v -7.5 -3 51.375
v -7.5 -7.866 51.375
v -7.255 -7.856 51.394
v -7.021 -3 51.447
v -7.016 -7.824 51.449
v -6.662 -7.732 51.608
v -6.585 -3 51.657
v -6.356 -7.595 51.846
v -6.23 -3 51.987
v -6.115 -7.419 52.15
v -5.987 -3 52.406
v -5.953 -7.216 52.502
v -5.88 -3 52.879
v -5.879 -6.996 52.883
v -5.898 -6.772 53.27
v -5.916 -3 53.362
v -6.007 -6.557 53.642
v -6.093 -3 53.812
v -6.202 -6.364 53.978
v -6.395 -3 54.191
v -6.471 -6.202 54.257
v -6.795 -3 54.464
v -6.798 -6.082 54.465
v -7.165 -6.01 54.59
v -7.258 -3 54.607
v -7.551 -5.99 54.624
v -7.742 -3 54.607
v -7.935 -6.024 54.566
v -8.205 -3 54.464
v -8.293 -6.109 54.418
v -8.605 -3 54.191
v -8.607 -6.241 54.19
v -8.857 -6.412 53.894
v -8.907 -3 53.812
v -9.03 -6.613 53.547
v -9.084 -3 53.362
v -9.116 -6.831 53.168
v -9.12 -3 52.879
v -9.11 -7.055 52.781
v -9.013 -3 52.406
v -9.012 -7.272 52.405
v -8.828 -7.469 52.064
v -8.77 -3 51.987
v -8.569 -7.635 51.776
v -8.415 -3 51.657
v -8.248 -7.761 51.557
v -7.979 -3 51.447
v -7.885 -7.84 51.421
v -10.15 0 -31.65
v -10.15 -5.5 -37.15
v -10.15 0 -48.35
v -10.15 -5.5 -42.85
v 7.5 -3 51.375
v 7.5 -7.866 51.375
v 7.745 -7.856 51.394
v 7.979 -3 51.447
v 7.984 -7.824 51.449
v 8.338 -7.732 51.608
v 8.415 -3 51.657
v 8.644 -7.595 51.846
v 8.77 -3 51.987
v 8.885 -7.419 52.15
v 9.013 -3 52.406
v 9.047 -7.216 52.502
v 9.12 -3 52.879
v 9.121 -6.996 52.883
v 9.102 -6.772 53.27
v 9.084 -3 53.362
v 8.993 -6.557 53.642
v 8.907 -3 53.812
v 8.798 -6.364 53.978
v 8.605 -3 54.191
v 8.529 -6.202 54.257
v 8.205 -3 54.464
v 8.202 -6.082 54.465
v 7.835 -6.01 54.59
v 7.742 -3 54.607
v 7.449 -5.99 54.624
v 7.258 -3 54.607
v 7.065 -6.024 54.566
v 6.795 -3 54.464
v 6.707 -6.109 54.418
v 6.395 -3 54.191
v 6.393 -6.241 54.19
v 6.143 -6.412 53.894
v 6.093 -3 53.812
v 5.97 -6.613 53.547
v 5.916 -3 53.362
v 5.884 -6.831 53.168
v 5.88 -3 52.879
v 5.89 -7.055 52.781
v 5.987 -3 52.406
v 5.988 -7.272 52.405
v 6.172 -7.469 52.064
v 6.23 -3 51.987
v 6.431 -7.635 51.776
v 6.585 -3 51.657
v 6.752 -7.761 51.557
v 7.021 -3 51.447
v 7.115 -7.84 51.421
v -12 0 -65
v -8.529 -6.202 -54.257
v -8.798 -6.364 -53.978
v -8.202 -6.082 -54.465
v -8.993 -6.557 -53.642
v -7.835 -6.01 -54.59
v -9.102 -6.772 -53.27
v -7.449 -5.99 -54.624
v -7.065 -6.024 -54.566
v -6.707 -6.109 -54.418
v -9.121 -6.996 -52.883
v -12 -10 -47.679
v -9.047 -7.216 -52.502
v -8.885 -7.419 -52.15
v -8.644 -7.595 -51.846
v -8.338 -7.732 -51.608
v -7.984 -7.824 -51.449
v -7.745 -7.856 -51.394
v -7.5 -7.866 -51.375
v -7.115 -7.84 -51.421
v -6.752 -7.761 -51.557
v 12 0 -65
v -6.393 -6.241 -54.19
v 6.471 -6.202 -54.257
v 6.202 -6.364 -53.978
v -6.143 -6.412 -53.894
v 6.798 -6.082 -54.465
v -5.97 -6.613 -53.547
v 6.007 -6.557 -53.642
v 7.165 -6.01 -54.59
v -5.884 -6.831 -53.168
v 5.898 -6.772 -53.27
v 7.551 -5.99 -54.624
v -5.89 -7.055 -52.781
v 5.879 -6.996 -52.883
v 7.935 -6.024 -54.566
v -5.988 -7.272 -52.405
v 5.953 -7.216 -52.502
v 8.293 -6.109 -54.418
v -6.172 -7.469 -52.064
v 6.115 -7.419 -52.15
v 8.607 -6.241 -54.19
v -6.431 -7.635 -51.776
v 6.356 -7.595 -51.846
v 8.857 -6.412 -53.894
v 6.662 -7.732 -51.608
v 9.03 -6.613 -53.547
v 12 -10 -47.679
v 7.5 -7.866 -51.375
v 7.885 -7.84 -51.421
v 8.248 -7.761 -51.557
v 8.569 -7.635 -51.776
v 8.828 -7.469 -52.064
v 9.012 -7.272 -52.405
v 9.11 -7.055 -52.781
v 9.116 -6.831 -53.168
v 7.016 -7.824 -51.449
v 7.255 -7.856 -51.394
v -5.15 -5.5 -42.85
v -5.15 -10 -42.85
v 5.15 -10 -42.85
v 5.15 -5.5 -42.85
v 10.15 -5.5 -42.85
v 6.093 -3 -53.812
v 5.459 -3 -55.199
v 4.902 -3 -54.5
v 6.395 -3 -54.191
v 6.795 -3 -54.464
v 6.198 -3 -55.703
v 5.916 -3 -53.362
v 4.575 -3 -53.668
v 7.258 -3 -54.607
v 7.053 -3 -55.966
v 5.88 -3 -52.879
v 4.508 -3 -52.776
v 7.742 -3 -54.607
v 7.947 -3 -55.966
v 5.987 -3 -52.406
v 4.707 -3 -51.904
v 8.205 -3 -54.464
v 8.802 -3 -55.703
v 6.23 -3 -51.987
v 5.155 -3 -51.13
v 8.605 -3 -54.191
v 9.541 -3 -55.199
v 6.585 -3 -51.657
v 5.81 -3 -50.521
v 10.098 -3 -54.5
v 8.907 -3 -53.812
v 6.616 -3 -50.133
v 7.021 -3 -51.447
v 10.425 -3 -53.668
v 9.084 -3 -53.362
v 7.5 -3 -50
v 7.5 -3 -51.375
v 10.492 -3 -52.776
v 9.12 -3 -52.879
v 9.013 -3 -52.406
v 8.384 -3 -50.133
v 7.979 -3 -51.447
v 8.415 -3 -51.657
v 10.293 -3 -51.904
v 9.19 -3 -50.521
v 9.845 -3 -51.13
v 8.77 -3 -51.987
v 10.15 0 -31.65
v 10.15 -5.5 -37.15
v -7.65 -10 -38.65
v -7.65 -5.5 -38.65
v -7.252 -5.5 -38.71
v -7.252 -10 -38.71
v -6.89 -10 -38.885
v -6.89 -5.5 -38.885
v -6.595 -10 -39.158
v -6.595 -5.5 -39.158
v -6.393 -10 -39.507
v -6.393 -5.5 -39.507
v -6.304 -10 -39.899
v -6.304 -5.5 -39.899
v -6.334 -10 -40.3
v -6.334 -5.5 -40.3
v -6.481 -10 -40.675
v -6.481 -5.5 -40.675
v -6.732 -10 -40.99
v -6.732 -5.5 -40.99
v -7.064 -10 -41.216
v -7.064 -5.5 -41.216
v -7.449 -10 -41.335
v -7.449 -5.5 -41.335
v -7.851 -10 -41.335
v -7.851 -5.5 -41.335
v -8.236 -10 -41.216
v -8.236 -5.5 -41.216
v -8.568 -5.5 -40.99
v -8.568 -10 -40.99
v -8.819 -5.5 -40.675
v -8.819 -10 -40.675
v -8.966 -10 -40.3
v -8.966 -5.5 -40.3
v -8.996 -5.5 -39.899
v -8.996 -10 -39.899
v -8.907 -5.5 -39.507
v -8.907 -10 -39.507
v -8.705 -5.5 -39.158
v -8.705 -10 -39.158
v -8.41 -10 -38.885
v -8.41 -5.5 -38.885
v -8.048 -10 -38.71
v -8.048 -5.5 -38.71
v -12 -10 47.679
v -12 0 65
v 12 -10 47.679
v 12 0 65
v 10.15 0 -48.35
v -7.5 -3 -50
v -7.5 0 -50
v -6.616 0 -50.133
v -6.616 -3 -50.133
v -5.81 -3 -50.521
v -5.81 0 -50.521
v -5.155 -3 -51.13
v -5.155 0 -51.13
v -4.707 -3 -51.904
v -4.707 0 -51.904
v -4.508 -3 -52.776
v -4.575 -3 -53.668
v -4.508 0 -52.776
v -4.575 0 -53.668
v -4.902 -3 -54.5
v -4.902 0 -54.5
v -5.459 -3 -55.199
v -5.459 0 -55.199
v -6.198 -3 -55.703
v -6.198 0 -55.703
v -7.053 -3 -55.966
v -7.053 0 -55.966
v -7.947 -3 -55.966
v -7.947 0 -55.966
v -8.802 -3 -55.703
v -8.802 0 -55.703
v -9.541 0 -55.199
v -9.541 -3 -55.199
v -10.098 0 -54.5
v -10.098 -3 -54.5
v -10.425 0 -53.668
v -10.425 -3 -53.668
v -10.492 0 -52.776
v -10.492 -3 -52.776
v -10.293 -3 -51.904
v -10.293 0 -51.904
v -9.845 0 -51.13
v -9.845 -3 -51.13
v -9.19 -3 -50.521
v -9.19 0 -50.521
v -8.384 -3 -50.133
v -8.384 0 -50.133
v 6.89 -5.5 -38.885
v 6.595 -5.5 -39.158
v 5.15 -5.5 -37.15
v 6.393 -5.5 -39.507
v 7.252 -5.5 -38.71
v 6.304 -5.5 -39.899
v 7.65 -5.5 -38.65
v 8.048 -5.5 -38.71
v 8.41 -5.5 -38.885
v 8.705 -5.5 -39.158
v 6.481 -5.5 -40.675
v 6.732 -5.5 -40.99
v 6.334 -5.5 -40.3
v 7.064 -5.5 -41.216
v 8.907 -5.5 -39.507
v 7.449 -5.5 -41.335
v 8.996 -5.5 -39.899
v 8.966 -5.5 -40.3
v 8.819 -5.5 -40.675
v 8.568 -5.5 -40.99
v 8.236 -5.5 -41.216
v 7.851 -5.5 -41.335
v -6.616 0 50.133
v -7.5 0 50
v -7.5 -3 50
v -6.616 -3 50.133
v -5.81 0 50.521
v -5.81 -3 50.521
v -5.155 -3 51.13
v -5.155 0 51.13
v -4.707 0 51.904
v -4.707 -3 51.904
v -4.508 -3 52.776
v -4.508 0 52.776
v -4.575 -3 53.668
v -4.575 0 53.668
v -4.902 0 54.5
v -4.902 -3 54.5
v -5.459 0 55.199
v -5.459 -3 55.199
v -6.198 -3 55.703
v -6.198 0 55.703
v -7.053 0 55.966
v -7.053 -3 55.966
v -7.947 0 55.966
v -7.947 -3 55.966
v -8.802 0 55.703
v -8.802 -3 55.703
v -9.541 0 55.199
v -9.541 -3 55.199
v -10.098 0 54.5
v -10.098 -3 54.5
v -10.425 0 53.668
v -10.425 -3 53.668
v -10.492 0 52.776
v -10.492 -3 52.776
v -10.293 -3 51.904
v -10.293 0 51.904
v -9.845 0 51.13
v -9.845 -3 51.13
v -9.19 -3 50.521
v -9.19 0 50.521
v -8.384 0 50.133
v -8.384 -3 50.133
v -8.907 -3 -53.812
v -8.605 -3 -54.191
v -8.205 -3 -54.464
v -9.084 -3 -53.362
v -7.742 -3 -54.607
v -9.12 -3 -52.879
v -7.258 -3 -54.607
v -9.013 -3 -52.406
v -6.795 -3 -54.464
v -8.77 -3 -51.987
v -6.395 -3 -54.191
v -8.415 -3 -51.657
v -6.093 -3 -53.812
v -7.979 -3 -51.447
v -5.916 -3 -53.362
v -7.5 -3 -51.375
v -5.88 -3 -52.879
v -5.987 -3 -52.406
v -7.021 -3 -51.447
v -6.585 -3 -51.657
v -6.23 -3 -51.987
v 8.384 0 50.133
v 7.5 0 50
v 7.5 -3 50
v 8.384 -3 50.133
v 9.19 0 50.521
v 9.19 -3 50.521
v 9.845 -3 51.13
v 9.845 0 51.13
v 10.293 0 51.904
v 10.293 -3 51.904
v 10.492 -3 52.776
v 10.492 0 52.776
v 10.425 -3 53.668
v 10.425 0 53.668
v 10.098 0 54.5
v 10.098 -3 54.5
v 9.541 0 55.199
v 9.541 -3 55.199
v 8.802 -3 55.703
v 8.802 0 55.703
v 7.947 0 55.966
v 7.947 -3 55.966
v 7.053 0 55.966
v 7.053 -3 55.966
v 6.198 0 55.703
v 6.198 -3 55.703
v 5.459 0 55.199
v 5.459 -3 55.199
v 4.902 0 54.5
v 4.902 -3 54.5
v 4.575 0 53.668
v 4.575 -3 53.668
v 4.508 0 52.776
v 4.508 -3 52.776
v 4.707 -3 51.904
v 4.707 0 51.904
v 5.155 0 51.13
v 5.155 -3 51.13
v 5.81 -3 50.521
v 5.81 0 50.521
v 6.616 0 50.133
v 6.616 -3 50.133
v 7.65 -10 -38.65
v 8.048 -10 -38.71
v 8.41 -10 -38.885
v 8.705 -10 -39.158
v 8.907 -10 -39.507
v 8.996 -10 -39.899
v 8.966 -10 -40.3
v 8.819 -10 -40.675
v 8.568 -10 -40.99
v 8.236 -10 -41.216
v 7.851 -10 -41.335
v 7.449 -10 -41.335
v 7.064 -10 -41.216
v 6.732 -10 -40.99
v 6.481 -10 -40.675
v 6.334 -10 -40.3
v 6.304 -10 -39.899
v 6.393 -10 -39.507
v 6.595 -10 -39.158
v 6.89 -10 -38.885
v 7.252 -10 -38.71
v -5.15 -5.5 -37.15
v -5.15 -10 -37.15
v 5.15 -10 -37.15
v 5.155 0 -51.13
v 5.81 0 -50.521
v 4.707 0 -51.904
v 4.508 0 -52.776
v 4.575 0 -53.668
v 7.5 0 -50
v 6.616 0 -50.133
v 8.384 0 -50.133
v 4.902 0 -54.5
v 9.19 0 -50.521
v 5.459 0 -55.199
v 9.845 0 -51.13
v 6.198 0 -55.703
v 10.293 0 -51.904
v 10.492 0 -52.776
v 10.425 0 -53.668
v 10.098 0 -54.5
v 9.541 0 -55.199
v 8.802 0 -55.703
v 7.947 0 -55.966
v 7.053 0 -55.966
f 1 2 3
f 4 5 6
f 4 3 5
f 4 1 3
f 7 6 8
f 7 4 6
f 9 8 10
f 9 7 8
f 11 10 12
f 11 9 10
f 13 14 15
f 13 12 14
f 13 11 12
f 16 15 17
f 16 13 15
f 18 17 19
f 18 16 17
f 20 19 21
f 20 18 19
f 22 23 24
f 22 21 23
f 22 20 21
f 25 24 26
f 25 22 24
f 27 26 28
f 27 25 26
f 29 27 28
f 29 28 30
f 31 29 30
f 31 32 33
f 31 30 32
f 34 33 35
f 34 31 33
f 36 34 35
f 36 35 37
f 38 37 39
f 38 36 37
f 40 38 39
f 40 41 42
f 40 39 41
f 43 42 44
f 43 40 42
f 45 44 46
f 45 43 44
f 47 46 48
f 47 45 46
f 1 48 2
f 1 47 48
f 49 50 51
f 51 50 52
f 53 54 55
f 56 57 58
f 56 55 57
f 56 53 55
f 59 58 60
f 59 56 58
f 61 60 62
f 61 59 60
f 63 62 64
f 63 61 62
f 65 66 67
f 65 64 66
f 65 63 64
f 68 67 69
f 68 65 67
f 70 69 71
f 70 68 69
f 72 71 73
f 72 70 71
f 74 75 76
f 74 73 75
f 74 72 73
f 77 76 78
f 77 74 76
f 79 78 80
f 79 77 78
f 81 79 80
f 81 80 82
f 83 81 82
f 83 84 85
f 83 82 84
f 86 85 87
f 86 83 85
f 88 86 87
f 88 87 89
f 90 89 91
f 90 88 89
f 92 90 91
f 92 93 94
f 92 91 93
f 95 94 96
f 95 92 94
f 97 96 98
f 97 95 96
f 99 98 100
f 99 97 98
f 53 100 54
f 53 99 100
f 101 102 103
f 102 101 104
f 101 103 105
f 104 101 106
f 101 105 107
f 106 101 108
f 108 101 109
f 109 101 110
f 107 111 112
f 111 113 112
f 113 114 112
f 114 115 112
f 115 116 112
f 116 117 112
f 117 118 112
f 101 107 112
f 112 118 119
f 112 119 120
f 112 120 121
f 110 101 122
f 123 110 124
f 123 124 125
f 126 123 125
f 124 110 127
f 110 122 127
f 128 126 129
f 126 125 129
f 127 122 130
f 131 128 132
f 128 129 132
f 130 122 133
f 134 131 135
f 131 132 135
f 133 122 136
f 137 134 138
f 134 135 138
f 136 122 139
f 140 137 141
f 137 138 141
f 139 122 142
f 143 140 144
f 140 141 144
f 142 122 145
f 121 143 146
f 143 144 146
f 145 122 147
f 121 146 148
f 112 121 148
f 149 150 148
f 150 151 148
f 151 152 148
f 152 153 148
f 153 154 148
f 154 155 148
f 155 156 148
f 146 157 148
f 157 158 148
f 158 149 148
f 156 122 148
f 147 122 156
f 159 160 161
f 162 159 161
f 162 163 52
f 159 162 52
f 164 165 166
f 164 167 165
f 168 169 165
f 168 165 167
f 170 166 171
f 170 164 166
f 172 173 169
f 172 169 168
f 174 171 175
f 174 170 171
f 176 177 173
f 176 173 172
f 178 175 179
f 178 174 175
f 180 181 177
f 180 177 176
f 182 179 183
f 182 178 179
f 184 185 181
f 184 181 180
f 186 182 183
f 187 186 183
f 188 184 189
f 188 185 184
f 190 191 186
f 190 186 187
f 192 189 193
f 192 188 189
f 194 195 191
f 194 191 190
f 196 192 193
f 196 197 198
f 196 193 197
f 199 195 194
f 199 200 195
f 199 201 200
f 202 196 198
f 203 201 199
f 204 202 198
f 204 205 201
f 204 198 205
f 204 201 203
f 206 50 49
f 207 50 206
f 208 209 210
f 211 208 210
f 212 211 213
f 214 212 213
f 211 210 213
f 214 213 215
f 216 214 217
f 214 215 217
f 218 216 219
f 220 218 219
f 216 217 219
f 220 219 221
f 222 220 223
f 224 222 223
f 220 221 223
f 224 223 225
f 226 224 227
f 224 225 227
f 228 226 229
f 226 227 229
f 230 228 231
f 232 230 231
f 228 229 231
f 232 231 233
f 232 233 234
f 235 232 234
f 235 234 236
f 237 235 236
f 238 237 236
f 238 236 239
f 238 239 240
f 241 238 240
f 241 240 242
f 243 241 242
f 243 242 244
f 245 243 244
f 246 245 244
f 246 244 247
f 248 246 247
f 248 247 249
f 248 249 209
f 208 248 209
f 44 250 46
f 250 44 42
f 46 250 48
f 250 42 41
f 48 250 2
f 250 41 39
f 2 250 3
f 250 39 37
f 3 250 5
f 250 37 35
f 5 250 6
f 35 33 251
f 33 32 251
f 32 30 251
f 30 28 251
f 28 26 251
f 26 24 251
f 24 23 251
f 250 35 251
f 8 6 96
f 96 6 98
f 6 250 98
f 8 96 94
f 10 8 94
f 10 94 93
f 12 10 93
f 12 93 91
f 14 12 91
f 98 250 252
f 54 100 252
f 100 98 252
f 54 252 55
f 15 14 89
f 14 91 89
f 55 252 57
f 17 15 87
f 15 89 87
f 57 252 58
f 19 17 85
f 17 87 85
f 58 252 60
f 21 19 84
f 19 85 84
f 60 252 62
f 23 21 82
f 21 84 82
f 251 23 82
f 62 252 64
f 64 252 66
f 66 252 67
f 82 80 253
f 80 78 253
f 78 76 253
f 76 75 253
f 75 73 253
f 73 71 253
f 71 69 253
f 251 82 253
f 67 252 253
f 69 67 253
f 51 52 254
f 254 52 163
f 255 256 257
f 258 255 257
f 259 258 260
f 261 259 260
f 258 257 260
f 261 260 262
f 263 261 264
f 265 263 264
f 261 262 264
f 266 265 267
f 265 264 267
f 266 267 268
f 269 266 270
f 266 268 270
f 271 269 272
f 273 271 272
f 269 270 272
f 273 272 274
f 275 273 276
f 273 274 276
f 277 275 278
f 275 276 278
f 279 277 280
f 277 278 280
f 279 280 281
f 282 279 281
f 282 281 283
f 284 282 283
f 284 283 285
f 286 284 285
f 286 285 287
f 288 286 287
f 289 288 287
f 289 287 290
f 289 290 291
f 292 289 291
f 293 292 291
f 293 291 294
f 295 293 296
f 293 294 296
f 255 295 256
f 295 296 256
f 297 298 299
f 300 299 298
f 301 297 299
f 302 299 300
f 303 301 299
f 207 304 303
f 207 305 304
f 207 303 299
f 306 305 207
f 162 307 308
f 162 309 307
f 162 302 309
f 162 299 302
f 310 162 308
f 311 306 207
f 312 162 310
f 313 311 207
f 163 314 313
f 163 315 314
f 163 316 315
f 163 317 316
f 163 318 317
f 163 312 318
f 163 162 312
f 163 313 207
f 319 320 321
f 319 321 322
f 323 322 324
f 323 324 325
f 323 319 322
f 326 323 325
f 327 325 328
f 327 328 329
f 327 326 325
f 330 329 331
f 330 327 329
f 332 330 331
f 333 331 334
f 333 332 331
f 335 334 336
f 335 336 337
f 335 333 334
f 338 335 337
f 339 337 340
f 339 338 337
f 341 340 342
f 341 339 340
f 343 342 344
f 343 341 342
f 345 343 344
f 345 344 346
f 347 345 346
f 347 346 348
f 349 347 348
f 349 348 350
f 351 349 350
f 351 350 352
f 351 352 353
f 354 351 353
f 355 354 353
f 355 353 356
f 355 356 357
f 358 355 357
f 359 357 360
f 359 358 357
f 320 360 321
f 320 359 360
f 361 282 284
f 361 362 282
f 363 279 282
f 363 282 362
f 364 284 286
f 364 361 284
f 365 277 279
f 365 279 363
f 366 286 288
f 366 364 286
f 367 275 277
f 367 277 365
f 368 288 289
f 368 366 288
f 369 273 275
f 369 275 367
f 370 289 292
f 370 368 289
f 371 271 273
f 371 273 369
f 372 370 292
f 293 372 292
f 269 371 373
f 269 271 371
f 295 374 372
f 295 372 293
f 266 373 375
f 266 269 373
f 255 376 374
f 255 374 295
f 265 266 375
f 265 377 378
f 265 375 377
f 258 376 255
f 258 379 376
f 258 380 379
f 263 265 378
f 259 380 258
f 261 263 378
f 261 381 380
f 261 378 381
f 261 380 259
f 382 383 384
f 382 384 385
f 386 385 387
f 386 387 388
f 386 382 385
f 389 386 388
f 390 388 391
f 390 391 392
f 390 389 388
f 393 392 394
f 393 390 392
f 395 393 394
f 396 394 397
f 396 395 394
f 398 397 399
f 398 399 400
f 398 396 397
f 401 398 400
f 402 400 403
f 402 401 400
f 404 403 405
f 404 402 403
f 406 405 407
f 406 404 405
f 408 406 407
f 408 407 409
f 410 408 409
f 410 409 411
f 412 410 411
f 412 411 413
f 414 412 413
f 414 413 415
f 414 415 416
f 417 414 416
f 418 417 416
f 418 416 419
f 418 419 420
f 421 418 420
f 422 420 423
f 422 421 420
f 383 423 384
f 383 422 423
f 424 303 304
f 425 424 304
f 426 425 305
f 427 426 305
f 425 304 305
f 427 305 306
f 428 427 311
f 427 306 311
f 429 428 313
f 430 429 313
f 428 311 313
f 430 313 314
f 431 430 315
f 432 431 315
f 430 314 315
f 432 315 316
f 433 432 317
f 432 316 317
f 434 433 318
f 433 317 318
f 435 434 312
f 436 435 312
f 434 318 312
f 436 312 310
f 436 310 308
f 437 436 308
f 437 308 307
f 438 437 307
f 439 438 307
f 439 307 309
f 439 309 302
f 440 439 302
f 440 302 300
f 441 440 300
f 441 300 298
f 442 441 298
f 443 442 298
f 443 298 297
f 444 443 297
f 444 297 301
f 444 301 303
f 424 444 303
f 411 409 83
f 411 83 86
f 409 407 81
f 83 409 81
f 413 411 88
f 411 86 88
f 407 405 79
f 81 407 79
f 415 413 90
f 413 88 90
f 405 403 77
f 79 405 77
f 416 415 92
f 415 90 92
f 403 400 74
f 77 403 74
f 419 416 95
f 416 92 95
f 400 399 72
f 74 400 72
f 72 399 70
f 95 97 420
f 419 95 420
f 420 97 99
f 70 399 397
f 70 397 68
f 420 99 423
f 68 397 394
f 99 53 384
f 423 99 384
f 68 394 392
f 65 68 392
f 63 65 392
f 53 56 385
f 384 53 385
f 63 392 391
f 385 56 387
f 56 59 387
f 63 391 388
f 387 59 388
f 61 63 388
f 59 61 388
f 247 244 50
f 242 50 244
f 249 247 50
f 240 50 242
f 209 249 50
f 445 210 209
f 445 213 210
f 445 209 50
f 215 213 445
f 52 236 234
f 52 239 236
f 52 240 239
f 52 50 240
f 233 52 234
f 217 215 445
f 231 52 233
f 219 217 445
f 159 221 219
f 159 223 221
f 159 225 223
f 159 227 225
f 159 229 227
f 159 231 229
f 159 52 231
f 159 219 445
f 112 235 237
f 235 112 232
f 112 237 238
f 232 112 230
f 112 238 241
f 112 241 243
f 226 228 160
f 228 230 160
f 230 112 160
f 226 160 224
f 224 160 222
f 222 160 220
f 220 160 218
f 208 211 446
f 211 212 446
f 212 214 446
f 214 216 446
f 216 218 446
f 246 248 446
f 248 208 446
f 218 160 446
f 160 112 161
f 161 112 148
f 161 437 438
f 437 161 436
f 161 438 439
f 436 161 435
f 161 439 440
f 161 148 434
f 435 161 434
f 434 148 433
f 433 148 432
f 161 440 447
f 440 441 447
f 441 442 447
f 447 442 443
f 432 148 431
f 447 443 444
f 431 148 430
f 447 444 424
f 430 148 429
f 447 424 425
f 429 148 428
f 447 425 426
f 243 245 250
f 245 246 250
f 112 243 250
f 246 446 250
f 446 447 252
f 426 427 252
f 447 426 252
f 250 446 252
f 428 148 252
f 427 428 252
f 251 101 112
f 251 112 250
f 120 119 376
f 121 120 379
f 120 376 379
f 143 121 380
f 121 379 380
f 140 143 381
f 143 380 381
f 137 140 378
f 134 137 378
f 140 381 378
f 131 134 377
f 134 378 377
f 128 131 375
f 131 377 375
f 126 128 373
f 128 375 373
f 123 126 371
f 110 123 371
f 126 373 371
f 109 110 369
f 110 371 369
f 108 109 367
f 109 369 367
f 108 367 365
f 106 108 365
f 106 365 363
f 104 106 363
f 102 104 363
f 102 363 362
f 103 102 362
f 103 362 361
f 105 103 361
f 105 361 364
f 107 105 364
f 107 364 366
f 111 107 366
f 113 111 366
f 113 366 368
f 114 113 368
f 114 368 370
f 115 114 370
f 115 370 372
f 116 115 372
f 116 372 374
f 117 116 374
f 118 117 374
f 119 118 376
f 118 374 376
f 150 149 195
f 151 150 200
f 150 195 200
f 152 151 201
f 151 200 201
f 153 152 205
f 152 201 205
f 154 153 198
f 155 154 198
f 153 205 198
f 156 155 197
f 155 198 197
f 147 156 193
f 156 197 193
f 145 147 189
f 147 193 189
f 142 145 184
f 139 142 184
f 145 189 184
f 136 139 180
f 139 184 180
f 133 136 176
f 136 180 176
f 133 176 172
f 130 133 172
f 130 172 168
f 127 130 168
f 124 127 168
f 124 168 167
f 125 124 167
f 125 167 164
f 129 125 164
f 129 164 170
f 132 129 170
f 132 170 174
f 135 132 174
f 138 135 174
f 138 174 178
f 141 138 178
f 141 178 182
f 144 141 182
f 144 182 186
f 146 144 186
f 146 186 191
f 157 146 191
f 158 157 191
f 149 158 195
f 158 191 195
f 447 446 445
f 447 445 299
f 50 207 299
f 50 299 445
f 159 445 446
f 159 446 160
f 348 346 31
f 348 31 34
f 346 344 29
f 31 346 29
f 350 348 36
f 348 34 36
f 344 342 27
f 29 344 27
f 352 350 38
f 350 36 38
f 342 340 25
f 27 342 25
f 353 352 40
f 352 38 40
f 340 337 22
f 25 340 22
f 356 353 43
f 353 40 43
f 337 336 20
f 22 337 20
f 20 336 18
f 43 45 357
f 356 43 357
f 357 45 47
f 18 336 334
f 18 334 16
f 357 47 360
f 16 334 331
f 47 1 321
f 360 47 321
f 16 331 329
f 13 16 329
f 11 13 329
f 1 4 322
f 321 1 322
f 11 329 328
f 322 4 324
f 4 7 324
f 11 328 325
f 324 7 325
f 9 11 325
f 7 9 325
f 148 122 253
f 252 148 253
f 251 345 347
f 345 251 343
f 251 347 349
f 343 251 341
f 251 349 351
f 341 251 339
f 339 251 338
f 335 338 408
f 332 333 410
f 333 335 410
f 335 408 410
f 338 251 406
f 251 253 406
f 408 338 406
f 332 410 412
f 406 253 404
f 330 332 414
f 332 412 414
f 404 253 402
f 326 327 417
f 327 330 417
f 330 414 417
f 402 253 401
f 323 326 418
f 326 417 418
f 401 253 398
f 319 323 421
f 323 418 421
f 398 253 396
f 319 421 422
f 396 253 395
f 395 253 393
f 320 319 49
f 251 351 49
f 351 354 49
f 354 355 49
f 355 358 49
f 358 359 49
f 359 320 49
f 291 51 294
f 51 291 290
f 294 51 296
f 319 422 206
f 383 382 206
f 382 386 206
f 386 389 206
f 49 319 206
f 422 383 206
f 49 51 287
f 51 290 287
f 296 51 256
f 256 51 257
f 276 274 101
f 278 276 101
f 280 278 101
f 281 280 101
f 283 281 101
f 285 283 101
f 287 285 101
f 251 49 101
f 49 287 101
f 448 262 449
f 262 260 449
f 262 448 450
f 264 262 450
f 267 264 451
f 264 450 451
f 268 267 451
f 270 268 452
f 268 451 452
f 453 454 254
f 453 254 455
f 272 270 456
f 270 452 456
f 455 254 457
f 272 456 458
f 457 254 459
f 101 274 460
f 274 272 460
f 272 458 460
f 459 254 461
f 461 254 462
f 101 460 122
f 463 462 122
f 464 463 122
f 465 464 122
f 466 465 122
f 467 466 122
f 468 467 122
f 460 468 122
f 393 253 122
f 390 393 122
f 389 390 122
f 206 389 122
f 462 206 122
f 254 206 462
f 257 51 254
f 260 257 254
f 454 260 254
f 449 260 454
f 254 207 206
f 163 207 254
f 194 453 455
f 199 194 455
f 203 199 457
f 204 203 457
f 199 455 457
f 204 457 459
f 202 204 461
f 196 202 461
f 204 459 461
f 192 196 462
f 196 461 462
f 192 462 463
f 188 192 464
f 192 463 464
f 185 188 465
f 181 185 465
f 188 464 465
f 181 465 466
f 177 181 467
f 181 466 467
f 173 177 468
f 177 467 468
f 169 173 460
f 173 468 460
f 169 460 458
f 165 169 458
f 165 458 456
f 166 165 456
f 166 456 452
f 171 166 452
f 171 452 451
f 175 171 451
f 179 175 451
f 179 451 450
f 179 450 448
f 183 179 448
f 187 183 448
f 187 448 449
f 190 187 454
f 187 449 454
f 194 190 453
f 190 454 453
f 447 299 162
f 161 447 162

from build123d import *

# Parameters (mm, degrees)
BOSS_EXTRUDE1_DEPTH     = 12
CUT_EXTRUDE1_DEPTH      = 67.850579653
CUT_EXTRUDE1_DEPTH_BACK = 5.5
SKETCH2_W               = 20.3
SKETCH2_H               = 5.7
SKETCH3_W               = 10.3
SKETCH3_H               = 5.7
SKETCH3_R               = 1.35
CUT_EXTRUDE2_DEPTH      = 5.5
CHAMFER1_SIZE           = 5.5
SKETCH4_R               = 1.625
CUT_EXTRUDE3_DEPTH      = 67.850579653
SKETCH5_R               = 3
CUT_EXTRUDE4_DEPTH      = 3


with BuildPart() as part:
    # Sketch1 → Boss-Extrude1 (new, symmetric)
    with BuildSketch(Plane(origin=(0, 0, 0), x_dir=(0, 0, -1), z_dir=(1, 0, 0))):
        Polygon((-65, 0), (65, 0), (47.679491924, -10), (-47.679491924, -10), align=None)
    extrude(amount=BOSS_EXTRUDE1_DEPTH, both=True)

    # Sketch2 → Cut-Extrude1 (cut, two sides: drawn at the far end of the back side and taken through both)
    with BuildSketch(Plane(origin=(0, 0, 0), x_dir=(1, 0, 0), z_dir=(0, 1, 0)).offset(-CUT_EXTRUDE1_DEPTH_BACK)):
        with Locations((0, 40)):
            Rectangle(SKETCH2_W, SKETCH2_H)
    extrude(amount=CUT_EXTRUDE1_DEPTH + CUT_EXTRUDE1_DEPTH_BACK, mode=Mode.SUBTRACT)

    # Sketch3 → Cut-Extrude2 (cut)
    with BuildSketch(Plane(origin=(0, -5.5, 0), x_dir=(1, 0, 0), z_dir=(0, 1, 0))):
        with Locations((0, 40)):
            Rectangle(SKETCH3_W, SKETCH3_H)
        with Locations(Location((-7.65, 40, 0), (0, 0, 270))):
            Circle(SKETCH3_R)
        with Locations(Location((7.65, 40, 0), (0, 0, 270))):
            Circle(SKETCH3_R)
    extrude(amount=-CUT_EXTRUDE2_DEPTH, mode=Mode.SUBTRACT)

    # Chamfer1
    chamfer1_edges = [part.edges().sort_by_distance(p)[0] for p in [
        (0, 0, -37.15),
        (0, 0, -42.85),
    ]]
    chamfer(chamfer1_edges, length=CHAMFER1_SIZE - 0.0001)  # a hair under: the kernel refuses the full size

    # Sketch4 → Cut-Extrude3 (cut, through all)
    with BuildSketch(Plane(origin=(0, 0, 0), x_dir=(1, 0, 0), z_dir=(0, 1, 0))):
        with Locations(Location((-7.5, 53, 0), (0, 0, 270))):
            Circle(SKETCH4_R)
        with Locations(Location((7.5, 53, 0), (0, 0, 270))):
            Circle(SKETCH4_R)
    cut_extrude3 = extrude(amount=-CUT_EXTRUDE3_DEPTH, mode=Mode.SUBTRACT)

    # Sketch5 → Cut-Extrude4 (cut)
    with BuildSketch(Plane(origin=(0, 0, 0), x_dir=(1, 0, 0), z_dir=(0, 1, 0))):
        with Locations(Location((-7.5, 53, 0), (0, 0, 270))):
            Circle(SKETCH5_R)
        with Locations(Location((7.5, 53, 0), (0, 0, 270))):
            Circle(SKETCH5_R)
    cut_extrude4 = extrude(amount=-CUT_EXTRUDE4_DEPTH, mode=Mode.SUBTRACT)

    # Mirror1: Cut-Extrude3, Cut-Extrude4 across plane
    add(cut_extrude3.mirror(Plane.XY), mode=Mode.SUBTRACT)
    add(cut_extrude4.mirror(Plane.XY), mode=Mode.SUBTRACT)


solid = part.part
